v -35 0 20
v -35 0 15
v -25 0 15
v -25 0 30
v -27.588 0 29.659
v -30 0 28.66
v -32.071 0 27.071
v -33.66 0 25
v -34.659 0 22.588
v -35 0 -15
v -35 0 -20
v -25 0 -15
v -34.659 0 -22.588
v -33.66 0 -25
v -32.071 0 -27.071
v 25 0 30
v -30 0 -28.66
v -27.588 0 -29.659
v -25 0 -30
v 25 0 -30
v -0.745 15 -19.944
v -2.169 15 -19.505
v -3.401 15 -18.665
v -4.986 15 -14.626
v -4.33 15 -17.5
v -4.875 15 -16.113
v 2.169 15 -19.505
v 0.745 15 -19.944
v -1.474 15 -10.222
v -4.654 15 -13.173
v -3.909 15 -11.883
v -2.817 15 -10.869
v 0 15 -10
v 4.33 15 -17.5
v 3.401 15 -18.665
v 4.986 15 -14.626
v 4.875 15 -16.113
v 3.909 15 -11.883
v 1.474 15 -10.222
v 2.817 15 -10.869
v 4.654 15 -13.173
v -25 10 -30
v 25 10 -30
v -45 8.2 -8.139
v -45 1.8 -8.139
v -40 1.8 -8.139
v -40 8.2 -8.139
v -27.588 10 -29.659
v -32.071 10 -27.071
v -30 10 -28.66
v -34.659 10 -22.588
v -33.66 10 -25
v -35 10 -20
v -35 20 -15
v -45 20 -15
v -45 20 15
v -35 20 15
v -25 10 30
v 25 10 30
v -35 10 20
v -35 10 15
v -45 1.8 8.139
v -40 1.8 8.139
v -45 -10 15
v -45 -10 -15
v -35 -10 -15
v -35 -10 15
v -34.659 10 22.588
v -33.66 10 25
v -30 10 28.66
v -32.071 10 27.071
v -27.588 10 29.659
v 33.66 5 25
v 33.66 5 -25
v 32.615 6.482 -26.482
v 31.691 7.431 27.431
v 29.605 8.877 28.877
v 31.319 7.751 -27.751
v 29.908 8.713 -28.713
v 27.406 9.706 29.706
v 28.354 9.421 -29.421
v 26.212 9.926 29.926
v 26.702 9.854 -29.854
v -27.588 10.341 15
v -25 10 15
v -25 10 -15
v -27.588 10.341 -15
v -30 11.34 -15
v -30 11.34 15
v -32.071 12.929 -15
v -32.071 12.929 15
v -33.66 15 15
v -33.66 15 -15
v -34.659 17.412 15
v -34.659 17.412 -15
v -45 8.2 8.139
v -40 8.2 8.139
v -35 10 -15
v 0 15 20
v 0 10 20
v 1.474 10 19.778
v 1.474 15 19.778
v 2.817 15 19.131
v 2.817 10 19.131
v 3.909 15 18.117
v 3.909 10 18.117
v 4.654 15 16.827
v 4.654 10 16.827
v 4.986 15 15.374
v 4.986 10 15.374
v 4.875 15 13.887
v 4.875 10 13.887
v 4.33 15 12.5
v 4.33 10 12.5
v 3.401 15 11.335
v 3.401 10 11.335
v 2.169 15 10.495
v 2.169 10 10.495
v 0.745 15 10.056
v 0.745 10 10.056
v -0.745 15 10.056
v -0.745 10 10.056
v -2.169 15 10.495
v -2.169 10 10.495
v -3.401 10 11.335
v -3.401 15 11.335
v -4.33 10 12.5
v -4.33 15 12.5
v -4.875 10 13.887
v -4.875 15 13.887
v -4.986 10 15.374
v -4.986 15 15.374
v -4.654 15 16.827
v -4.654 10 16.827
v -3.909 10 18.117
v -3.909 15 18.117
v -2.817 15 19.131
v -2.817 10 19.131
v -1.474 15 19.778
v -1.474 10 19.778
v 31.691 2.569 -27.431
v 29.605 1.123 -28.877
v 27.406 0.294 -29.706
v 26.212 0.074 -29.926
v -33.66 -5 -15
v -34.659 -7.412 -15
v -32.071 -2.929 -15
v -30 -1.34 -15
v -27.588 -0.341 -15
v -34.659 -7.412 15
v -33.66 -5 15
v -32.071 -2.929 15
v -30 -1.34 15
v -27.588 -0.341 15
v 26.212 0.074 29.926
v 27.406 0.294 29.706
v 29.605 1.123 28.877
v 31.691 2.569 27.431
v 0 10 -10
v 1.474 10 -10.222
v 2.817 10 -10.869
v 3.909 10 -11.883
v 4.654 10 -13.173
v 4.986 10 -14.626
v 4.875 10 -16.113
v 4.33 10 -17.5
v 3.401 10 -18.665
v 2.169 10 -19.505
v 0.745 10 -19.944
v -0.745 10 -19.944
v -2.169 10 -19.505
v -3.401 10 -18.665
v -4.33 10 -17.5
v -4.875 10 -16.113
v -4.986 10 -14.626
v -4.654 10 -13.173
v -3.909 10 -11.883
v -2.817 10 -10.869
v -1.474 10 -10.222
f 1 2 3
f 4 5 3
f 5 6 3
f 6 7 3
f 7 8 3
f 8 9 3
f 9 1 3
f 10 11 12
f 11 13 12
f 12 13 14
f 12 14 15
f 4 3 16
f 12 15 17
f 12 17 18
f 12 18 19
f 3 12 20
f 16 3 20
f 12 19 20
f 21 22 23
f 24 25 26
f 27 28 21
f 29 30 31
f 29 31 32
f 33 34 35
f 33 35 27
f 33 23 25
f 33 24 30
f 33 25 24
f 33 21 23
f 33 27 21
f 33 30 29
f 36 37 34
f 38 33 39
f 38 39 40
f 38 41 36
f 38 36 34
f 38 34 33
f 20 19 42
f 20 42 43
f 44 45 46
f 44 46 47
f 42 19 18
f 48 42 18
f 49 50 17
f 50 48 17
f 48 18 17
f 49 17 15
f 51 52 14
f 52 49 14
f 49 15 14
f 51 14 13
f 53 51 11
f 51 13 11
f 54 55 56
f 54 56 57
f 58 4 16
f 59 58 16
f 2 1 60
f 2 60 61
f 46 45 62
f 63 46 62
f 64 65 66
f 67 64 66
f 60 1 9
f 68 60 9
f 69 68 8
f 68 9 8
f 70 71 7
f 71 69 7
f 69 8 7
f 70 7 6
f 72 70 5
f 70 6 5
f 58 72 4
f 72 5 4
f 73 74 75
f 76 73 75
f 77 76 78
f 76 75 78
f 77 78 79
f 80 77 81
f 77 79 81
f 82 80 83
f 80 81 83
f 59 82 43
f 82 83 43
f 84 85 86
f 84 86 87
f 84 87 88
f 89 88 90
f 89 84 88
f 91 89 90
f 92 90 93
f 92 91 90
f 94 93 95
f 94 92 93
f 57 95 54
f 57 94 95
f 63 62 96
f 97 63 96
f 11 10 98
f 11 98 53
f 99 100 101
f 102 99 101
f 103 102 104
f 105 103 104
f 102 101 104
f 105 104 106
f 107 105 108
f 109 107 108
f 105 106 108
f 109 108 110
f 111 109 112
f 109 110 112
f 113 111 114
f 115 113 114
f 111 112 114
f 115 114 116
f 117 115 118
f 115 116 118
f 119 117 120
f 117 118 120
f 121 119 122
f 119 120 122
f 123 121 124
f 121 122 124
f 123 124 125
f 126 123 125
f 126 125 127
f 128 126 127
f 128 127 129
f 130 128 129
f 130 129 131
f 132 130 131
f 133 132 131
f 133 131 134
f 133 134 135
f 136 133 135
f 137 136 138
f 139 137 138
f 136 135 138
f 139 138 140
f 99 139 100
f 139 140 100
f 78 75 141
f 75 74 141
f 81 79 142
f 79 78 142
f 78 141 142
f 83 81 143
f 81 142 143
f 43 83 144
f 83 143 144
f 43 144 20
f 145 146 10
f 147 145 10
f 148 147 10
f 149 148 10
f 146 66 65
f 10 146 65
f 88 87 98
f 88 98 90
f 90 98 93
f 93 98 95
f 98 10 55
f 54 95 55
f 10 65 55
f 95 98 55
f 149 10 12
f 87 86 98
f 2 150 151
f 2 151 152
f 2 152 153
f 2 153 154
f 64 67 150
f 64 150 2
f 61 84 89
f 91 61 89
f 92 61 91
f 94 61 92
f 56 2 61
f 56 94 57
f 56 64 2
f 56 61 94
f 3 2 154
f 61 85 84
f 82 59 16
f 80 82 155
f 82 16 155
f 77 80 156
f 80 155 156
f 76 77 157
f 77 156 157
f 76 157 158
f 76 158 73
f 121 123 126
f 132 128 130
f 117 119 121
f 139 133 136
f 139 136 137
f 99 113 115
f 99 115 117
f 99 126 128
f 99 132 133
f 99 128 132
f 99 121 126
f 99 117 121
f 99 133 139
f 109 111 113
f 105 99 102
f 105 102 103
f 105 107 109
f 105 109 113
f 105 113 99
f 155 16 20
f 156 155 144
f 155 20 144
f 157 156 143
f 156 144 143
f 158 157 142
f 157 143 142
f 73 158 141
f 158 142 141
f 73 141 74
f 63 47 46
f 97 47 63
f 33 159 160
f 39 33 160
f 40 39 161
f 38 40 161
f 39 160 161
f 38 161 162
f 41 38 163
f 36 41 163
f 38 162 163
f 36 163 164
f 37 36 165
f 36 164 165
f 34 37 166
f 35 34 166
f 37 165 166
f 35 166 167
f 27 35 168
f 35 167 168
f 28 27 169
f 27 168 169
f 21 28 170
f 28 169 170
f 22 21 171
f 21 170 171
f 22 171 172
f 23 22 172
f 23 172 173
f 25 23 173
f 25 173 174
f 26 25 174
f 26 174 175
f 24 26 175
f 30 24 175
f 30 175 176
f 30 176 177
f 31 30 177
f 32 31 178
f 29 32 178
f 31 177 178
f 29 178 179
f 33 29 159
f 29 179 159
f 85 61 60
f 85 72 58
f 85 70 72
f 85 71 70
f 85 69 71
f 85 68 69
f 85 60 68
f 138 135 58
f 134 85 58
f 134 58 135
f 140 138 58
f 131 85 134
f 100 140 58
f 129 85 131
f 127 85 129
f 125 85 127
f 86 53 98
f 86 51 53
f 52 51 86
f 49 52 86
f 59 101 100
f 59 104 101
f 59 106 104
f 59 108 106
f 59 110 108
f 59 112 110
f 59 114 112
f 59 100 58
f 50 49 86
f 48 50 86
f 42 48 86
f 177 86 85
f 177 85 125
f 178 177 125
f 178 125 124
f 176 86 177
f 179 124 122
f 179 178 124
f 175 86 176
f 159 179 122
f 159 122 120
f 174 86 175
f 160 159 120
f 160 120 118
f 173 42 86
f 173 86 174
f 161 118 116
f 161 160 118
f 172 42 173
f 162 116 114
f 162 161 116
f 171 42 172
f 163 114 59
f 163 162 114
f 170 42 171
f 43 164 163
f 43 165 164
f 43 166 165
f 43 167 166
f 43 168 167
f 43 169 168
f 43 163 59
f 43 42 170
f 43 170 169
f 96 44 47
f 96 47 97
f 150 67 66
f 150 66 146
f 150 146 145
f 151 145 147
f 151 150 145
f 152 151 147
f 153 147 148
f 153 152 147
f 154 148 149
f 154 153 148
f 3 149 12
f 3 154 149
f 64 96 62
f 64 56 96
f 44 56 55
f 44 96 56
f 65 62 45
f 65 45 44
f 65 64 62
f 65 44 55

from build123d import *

# Parameters (mm, degrees)
SKETCH1_W                = 10
SKETCH1_H                = 30
SKETCH1_W_2              = 70
SKETCH1_H_2              = 60
BOSS_EXTRUDE1_DEPTH      = 10
BOSS_EXTRUDE2_DEPTH      = 10
BOSS_EXTRUDE2_DEPTH_BACK = 20
SKETCH2_W                = 10
SKETCH2_H                = 30
FILLET1_R                = 10
SKETCH3_R                = 5
BOSS_EXTRUDE3_DEPTH      = 5
SKETCH4_W                = 16.278089822
SKETCH4_H                = 6.399401724
CUT_EXTRUDE1_DEPTH       = 5


with BuildPart() as part:
    # Sketch1 → Boss-Extrude1 (new body)
    with BuildSketch(Plane(origin=(0, 0, 0), x_dir=(1, 0, 0), z_dir=(0, 1, 0))):
        with Locations((-40, 0)):
            Rectangle(SKETCH1_W, SKETCH1_H)
        Rectangle(SKETCH1_W_2, SKETCH1_H_2)
    extrude(amount=BOSS_EXTRUDE1_DEPTH)

    # Sketch2 → Boss-Extrude2 (add, two sides: drawn at the far end of the back side and taken through both)
    with BuildSketch(Plane(origin=(0, 10, 0), x_dir=(1, 0, 0), z_dir=(0, 1, 0)).offset(-BOSS_EXTRUDE2_DEPTH_BACK)):
        with Locations((-40, 0)):
            Rectangle(SKETCH2_W, SKETCH2_H)
    extrude(amount=BOSS_EXTRUDE2_DEPTH + BOSS_EXTRUDE2_DEPTH_BACK)

    # Fillet1
    # the kernel refuses this fillet: 10 mm, written as the material it adds along each edge
    with BuildSketch(Plane(origin=(-35, 0, 15), x_dir=(0, -1, 0), z_dir=(0, 0, -1)), Plane(origin=(-35, 10, 15), x_dir=(1, 0, 0), z_dir=(0, 0, -1))) as fillet1_piece_1:
        with BuildLine():
            CenterArc((FILLET1_R, -FILLET1_R), FILLET1_R, 90, 90)
            Line((0, -FILLET1_R), (0, 0))
            Line((0, 0), (FILLET1_R, 0))
        make_face()
    extrude(amount=30)
    # the kernel refuses this fillet: 10 mm, written as the material it takes off along each edge
    with BuildSketch(Plane(origin=(35, 0, -55), x_dir=(0, 1, 0), z_dir=(0, 0, 1))) as fillet1_2_piece_1:
        with BuildLine():
            CenterArc((FILLET1_R, FILLET1_R), FILLET1_R, 180, 90)
            Line((0, FILLET1_R), (0, 0))
            Line((0, 0), (FILLET1_R, 0))
        make_face()
    extrude(amount=110, mode=Mode.SUBTRACT)
    with BuildSketch(Plane(origin=(-35, -25, -30), x_dir=(1, 0, 0), z_dir=(0, 1, 0)), Plane(origin=(35, -25, -30), x_dir=(0, 0, 1), z_dir=(0, 1, 0))) as fillet1_2_piece_2:
        with BuildLine():
            CenterArc((FILLET1_R, -FILLET1_R), FILLET1_R, 90, 90)
            Line((0, -FILLET1_R), (0, 0))
            Line((0, 0), (FILLET1_R, 0))
        make_face()
    extrude(amount=60, mode=Mode.SUBTRACT)
    with BuildSketch(Plane(origin=(35, -25, 30), x_dir=(0, 0, -1), z_dir=(0, 1, 0)), Plane(origin=(-35, -25, 30), x_dir=(1, 0, 0), z_dir=(0, 1, 0))) as fillet1_2_piece_3:
        with BuildLine():
            CenterArc((FILLET1_R, FILLET1_R), FILLET1_R, 180, 90)
            Line((0, FILLET1_R), (0, 0))
            Line((0, 0), (FILLET1_R, 0))
        make_face()
    extrude(amount=60, mode=Mode.SUBTRACT)
    with BuildSketch(Plane(origin=(35, 10, -55), x_dir=(0, -1, 0), z_dir=(0, 0, 1))) as fillet1_2_piece_4:
        with BuildLine():
            CenterArc((FILLET1_R, -FILLET1_R), FILLET1_R, 90, 90)
            Line((0, -FILLET1_R), (0, 0))
            Line((0, 0), (FILLET1_R, 0))
        make_face()
    extrude(amount=110, mode=Mode.SUBTRACT)

    # Sketch3 → Boss-Extrude3 (add)
    with BuildSketch(Plane(origin=(0, 10, 0), x_dir=(1, 0, 0), z_dir=(0, 1, 0))):
        with Locations(Location((0, 15, 0), (0, 0, 270))):
            Circle(SKETCH3_R)
        with Locations(Location((0, -15, 0), (0, 0, 270))):
            Circle(SKETCH3_R)
    extrude(amount=BOSS_EXTRUDE3_DEPTH)

    # Sketch4 → Cut-Extrude1 (cut)
    with BuildSketch(Plane.ZY.offset(45)):
        with Locations((0, 5)):
            Rectangle(SKETCH4_W, SKETCH4_H)
    extrude(amount=-CUT_EXTRUDE1_DEPTH, mode=Mode.SUBTRACT)


solid = part.part
